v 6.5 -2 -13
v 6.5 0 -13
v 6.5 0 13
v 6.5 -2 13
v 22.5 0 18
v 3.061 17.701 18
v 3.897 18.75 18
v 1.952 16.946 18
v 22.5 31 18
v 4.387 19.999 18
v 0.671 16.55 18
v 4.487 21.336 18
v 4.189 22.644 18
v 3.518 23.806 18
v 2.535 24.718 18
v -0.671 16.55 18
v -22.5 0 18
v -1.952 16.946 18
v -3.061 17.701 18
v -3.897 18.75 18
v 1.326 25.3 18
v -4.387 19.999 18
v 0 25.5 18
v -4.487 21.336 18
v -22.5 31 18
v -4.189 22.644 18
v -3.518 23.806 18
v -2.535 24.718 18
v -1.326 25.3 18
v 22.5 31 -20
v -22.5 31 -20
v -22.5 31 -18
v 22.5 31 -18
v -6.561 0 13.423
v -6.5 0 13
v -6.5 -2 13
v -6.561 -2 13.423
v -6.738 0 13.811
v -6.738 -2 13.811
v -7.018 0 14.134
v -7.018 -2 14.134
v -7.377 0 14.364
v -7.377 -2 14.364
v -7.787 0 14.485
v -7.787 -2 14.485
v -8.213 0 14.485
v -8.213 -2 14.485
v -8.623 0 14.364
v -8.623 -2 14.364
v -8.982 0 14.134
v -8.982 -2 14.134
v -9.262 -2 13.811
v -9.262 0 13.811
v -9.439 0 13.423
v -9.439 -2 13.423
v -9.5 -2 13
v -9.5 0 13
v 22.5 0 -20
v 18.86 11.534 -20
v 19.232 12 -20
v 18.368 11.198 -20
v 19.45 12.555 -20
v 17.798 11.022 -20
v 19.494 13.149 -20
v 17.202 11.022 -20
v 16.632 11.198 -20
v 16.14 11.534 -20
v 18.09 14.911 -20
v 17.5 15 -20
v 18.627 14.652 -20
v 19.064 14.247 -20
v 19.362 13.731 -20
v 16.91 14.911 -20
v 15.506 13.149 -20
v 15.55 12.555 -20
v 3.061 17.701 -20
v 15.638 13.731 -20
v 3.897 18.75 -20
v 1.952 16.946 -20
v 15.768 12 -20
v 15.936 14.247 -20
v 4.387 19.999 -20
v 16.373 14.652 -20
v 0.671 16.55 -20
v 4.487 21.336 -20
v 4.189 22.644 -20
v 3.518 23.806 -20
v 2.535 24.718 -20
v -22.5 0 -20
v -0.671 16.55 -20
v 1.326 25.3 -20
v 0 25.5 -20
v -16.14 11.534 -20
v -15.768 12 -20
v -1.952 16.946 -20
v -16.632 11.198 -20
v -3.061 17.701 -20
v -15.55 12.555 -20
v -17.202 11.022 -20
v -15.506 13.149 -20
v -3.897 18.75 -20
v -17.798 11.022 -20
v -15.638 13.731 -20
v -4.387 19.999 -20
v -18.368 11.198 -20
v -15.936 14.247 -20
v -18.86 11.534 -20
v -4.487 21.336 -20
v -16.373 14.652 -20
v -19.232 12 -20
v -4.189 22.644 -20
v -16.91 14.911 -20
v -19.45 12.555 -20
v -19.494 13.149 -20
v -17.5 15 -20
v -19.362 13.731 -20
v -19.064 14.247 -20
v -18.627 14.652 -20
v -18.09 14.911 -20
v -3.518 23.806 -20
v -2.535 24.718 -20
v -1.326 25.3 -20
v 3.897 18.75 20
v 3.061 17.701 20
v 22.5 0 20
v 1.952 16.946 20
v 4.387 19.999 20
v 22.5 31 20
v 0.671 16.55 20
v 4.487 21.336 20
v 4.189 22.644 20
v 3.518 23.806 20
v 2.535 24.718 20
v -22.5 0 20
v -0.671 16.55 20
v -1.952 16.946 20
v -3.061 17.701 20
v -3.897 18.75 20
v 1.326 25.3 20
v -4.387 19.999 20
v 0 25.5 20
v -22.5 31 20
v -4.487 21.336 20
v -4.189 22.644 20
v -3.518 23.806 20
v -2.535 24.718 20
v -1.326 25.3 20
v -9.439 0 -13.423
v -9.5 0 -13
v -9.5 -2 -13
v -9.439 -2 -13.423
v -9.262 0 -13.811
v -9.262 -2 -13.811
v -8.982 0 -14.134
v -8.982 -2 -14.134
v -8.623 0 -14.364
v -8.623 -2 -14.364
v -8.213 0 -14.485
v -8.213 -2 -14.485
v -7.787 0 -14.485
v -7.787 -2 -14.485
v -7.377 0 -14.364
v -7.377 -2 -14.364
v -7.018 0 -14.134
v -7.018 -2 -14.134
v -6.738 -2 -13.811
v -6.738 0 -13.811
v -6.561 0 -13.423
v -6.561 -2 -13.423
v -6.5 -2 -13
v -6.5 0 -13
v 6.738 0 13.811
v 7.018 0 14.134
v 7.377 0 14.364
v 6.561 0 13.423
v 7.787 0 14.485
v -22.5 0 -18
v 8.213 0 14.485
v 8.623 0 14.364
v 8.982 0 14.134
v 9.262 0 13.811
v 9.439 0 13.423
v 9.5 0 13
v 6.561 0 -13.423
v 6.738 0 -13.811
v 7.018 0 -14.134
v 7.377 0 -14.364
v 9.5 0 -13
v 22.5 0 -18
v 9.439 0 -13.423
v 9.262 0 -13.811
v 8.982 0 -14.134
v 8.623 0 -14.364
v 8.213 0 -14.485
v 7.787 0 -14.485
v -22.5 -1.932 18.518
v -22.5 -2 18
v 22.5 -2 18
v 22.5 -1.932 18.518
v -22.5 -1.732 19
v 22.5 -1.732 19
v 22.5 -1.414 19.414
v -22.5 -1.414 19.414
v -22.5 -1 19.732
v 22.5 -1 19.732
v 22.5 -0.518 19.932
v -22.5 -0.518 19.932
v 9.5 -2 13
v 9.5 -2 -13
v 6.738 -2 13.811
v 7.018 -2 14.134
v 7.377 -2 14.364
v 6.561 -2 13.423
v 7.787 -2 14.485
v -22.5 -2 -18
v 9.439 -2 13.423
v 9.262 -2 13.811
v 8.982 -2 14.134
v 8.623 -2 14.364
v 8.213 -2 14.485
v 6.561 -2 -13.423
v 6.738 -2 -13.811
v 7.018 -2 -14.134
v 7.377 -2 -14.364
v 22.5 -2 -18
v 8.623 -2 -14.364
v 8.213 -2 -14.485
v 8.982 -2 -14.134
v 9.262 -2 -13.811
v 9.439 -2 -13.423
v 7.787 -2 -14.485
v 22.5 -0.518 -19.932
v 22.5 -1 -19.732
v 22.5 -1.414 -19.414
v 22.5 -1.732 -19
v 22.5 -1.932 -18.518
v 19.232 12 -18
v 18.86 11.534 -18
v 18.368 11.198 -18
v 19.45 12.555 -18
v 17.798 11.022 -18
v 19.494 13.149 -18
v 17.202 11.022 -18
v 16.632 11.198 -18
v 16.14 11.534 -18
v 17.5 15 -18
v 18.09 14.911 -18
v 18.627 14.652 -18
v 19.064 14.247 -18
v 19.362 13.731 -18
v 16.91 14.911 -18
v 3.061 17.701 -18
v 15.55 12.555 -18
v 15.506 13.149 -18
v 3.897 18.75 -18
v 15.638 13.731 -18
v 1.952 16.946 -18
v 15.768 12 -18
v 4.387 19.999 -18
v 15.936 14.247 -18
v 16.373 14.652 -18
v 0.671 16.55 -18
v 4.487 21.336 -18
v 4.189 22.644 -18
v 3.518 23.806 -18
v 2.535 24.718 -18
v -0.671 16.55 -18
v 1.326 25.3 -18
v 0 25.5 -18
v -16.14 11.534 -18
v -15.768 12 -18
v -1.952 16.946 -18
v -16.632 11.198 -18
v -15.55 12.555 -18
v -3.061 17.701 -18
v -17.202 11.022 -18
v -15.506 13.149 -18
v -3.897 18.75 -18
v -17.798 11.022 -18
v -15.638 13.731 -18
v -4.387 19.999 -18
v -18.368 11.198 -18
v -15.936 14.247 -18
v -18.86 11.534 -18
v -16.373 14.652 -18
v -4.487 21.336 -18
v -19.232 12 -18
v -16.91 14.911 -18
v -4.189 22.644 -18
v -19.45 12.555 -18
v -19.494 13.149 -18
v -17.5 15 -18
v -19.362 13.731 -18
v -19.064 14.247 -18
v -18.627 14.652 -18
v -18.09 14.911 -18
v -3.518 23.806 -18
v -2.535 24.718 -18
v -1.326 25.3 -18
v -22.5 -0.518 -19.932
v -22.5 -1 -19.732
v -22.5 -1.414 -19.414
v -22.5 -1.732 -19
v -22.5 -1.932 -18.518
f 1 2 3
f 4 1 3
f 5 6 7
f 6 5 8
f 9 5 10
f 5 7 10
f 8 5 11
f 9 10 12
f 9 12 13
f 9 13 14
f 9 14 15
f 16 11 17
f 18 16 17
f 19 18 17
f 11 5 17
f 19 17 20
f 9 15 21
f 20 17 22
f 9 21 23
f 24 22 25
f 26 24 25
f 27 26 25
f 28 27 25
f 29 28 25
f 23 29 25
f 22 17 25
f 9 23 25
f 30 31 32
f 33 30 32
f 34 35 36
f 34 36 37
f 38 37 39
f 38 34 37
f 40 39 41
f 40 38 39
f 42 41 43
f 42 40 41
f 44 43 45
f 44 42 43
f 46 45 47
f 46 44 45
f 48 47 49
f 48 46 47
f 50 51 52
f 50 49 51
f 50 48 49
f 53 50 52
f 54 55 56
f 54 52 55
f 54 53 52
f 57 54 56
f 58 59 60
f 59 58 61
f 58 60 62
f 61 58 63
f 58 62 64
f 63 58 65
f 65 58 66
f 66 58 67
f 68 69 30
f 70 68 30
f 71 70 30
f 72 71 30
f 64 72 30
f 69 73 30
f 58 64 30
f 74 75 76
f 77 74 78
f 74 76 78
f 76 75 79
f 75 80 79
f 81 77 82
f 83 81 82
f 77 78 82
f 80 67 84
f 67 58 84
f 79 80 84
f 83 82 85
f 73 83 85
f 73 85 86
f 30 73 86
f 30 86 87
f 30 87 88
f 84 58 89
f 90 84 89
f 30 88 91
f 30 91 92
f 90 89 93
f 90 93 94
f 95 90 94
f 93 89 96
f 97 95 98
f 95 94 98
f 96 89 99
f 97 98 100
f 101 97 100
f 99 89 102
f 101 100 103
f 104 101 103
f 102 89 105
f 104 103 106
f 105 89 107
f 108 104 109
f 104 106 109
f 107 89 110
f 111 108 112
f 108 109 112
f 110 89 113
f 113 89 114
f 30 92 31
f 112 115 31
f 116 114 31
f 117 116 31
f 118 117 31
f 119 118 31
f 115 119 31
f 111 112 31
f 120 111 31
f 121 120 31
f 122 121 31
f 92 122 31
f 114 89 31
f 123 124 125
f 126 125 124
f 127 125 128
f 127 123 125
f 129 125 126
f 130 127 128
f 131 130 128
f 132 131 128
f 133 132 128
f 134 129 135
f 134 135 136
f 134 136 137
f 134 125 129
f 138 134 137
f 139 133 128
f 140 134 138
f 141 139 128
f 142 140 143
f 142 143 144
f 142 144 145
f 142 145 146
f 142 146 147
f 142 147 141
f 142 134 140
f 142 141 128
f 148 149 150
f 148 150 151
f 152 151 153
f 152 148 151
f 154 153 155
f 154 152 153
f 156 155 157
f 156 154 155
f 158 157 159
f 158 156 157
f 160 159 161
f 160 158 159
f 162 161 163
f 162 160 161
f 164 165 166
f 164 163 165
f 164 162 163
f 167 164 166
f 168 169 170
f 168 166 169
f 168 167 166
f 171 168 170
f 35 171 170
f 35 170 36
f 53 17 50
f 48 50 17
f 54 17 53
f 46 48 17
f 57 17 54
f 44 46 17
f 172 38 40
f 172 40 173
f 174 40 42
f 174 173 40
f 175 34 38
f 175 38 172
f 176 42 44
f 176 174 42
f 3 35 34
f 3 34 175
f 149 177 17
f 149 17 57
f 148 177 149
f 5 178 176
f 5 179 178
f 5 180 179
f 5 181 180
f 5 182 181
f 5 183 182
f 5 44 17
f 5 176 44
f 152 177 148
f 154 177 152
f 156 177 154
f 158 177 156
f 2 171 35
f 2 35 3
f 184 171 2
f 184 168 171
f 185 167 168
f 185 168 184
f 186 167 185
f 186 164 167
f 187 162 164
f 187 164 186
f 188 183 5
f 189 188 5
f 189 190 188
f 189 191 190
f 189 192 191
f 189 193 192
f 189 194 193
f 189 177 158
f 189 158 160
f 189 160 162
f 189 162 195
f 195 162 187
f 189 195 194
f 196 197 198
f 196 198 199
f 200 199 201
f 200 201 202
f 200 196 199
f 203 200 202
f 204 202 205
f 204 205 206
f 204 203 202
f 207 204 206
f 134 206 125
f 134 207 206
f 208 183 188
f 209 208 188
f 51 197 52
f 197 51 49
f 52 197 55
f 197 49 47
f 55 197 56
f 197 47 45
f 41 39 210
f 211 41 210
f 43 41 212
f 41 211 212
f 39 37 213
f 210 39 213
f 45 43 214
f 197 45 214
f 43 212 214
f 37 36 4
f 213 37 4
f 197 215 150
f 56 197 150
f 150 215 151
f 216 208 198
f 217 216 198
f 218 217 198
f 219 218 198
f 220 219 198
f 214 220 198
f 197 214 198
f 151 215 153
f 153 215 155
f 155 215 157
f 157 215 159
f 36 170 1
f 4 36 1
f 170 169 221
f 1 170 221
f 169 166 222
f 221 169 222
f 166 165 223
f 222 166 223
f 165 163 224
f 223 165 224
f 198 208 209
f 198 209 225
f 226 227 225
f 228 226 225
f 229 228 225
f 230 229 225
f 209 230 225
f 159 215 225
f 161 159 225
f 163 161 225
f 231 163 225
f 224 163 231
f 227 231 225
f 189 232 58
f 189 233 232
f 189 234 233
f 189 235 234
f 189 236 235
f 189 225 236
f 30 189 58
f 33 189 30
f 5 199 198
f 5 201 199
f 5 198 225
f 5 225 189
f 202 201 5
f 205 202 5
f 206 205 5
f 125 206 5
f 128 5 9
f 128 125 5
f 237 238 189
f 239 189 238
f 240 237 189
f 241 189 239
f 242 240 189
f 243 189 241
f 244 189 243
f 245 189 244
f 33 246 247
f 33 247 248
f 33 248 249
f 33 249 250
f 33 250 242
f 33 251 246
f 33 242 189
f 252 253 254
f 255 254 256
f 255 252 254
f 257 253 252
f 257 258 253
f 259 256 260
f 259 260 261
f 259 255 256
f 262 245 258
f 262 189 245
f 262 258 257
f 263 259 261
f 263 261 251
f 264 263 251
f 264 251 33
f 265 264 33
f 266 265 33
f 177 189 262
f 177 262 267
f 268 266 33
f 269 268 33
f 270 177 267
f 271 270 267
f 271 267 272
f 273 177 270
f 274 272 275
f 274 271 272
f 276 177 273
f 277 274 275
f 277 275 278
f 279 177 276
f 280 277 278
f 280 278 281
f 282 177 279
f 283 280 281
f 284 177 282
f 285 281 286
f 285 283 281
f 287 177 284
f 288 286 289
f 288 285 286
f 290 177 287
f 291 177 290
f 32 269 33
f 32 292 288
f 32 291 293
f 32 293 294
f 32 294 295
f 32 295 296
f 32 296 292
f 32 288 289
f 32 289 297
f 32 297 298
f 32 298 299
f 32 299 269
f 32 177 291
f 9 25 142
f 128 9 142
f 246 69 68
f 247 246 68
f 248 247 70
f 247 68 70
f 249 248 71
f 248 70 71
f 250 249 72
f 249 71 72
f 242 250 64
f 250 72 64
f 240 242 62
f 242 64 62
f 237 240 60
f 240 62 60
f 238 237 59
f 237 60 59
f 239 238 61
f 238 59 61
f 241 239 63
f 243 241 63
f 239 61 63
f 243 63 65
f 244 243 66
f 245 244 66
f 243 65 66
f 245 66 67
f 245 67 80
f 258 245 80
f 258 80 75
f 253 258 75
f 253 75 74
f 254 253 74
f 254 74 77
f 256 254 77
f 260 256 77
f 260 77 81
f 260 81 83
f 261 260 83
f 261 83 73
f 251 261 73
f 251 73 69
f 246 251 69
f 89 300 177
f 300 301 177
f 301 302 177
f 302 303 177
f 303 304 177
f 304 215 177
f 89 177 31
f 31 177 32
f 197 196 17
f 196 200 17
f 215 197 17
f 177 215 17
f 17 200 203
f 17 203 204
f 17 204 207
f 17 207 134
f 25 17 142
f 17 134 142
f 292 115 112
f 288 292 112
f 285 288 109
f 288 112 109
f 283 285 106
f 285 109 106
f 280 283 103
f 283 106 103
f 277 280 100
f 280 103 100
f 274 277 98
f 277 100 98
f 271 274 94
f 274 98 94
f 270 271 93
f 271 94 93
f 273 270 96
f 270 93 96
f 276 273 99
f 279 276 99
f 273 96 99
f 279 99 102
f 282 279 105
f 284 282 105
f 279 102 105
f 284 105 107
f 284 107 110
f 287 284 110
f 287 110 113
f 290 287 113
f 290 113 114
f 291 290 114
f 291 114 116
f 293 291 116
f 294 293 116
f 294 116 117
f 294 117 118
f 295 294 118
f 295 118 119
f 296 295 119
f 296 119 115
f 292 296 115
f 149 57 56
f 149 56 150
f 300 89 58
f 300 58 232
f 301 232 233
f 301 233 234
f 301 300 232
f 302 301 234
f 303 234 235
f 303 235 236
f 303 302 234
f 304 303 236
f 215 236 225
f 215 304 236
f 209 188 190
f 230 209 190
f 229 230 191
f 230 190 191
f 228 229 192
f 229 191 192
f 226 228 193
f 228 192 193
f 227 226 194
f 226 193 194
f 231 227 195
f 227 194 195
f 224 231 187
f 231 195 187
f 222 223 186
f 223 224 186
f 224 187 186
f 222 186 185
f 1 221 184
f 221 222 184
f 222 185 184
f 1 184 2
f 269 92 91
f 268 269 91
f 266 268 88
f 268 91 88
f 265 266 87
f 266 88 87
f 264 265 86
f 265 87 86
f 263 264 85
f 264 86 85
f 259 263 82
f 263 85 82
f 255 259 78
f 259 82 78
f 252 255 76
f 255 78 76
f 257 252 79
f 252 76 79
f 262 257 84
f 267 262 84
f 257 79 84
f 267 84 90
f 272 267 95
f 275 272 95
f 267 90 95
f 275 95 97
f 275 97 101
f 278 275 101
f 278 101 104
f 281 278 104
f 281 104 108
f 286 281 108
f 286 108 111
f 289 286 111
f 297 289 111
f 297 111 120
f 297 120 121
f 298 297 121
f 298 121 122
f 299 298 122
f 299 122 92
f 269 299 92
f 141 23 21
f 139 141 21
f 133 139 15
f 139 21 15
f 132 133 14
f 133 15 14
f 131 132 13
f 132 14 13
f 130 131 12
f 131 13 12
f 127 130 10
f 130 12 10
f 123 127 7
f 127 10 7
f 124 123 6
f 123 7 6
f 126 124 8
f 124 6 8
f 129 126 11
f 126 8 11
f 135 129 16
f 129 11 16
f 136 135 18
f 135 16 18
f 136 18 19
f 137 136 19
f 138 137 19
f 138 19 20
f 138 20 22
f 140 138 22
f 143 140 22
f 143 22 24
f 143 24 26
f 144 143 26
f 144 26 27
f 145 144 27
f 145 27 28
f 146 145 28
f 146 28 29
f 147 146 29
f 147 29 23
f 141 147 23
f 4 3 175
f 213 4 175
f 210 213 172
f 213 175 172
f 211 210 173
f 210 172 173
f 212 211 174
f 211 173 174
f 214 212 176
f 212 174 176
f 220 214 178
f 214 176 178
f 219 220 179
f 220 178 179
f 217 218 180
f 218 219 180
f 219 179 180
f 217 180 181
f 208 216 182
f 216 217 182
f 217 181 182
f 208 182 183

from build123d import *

# Parameters (mm, degrees)
SZKIC1_W                       = 45
SZKIC1_H                       = 40
ODGI_CIE_BAZOWE1_DEPTH         = 2
ODGI_CIE_START                 = -22.5
ODGI_CIE_KRAW_DZI1_DEPTH       = 45
ODGI_CIE_KRAW_DZI1_2_OUTLINE_W = 31
ODGI_CIE_KRAW_DZI1_2_OUTLINE_H = 2
ODGI_CIE_KRAW_DZI1_2_DEPTH     = 45
WYTNIJ_WYCI_GNI_CIE1_REACH     = 45.212
SZKIC13_R                      = 4.5
WYTNIJ_WYCI_GNI_CIE2_DEPTH     = 56.38275905
WYTNIJ_WYCI_GNI_CIE3_REACH     = 57.383
SZKIC14_R                      = 2


# Read off the part's stored shape, not the designer's step: Odgięcie krawędzi1
# Sheet-metal steps are written as plain solids
with BuildPart() as part:
    # Szkic1 → Odgięcie bazowe1 (new body)
    with BuildSketch(Plane(origin=(0, 0, 0), x_dir=(1, 0, 0), z_dir=(0, 1, 0))):
        Rectangle(SZKIC1_W, SZKIC1_H)
    extrude(amount=-ODGI_CIE_BAZOWE1_DEPTH)

    # Odgięcie krawędzi1 outline → Odgięcie krawędzi1 (cut)
    with BuildSketch(Plane.YZ.offset(ODGI_CIE_START)):
        with BuildLine():
            ThreePointArc((0, -20), (-1.414213562, -19.414213562), (-2, -18))
            Line((-2, -18), (-2, -20))
            Line((-2, -20), (0, -20))
        make_face()
        with BuildLine():
            Line((-2, 20), (-2, 18))
            ThreePointArc((-2, 18), (-1.414213562, 19.414213562), (0, 20))
            Line((0, 20), (-2, 20))
        make_face()
    extrude(amount=ODGI_CIE_KRAW_DZI1_DEPTH, mode=Mode.SUBTRACT)

    # Odgi_cie kraw_dzi1 2 outline → Odgi_cie kraw_dzi1 2 (add)
    with BuildSketch(Plane.YZ.offset(ODGI_CIE_START)):
        with Locations((15.5, -19)):
            Rectangle(ODGI_CIE_KRAW_DZI1_2_OUTLINE_W, ODGI_CIE_KRAW_DZI1_2_OUTLINE_H)
        with Locations((15.5, 19)):
            Rectangle(ODGI_CIE_KRAW_DZI1_2_OUTLINE_W, ODGI_CIE_KRAW_DZI1_2_OUTLINE_H)
    extrude(amount=ODGI_CIE_KRAW_DZI1_2_DEPTH)

    # Szkic12 → Wytnij-wyciągnięcie1 (cut, up to next)
    with BuildSketch(Plane(origin=(0, 0, 0), x_dir=(1, 0, 0), z_dir=(0, 1, 0)), mode=Mode.PRIVATE) as wytnij_wyci_gni_cie1_sk1:
        with BuildLine():
            Line((-9.5, -13), (-9.5, 13))
            ThreePointArc((-9.5, 13), (-8, 14.5), (-6.5, 13))
            Line((-6.5, 13), (-6.5, -13))
            ThreePointArc((-6.5, -13), (-8, -14.5), (-9.5, -13))
        make_face()
    wytnij_wyci_gni_cie1_tool1 = extrude(wytnij_wyci_gni_cie1_sk1.sketch, amount=-WYTNIJ_WYCI_GNI_CIE1_REACH, mode=Mode.PRIVATE) & part.part
    wytnij_wyci_gni_cie1 = wytnij_wyci_gni_cie1_tool1.solids().sort_by_distance((-8, 0, 0))[0]
    add(wytnij_wyci_gni_cie1, mode=Mode.SUBTRACT)

    # Lustro1: Wytnij-wyciągnięcie1 across plane
    add(wytnij_wyci_gni_cie1.mirror(Plane(origin=(0, 0, 0), x_dir=(0, 0, 1), z_dir=(1, 0, 0))), mode=Mode.SUBTRACT)

    # Szkic13 → Wytnij-wyciągnięcie2 (cut, through all)
    with BuildSketch(Plane(origin=(0, 0, -20), x_dir=(-1, 0, 0), z_dir=(0, 0, -1))):
        with Locations(Location((0, 21, 0), (0, 0, 90))):
            Circle(SZKIC13_R)
    extrude(amount=-WYTNIJ_WYCI_GNI_CIE2_DEPTH, mode=Mode.SUBTRACT)

    # Szkic14 → Wytnij-wyciągnięcie3 (cut, up to next)
    with BuildSketch(Plane(origin=(0, 0, -20), x_dir=(-1, 0, 0), z_dir=(0, 0, -1)), mode=Mode.PRIVATE) as wytnij_wyci_gni_cie3_sk1:
        with Locations(Location((-17.5, 13, 0), (0, 0, 90))):
            Circle(SZKIC14_R)
    wytnij_wyci_gni_cie3_tool1 = extrude(wytnij_wyci_gni_cie3_sk1.sketch, amount=-WYTNIJ_WYCI_GNI_CIE3_REACH, mode=Mode.PRIVATE) & part.part
    # Szkic14 → Wytnij-wyciągnięcie3 (cut, up to next)
    with BuildSketch(Plane(origin=(0, 0, -20), x_dir=(-1, 0, 0), z_dir=(0, 0, -1)), mode=Mode.PRIVATE) as wytnij_wyci_gni_cie3_sk2:
        with Locations(Location((17.5, 13, 0), (0, 0, 90))):
            Circle(SZKIC14_R)
    wytnij_wyci_gni_cie3_tool2 = extrude(wytnij_wyci_gni_cie3_sk2.sketch, amount=-WYTNIJ_WYCI_GNI_CIE3_REACH, mode=Mode.PRIVATE) & part.part
    add(wytnij_wyci_gni_cie3_tool1.solids().sort_by_distance((17.5, 13, -20))[0], mode=Mode.SUBTRACT)
    add(wytnij_wyci_gni_cie3_tool2.solids().sort_by_distance((-17.5, 13, -20))[0], mode=Mode.SUBTRACT)


solid = part.part
